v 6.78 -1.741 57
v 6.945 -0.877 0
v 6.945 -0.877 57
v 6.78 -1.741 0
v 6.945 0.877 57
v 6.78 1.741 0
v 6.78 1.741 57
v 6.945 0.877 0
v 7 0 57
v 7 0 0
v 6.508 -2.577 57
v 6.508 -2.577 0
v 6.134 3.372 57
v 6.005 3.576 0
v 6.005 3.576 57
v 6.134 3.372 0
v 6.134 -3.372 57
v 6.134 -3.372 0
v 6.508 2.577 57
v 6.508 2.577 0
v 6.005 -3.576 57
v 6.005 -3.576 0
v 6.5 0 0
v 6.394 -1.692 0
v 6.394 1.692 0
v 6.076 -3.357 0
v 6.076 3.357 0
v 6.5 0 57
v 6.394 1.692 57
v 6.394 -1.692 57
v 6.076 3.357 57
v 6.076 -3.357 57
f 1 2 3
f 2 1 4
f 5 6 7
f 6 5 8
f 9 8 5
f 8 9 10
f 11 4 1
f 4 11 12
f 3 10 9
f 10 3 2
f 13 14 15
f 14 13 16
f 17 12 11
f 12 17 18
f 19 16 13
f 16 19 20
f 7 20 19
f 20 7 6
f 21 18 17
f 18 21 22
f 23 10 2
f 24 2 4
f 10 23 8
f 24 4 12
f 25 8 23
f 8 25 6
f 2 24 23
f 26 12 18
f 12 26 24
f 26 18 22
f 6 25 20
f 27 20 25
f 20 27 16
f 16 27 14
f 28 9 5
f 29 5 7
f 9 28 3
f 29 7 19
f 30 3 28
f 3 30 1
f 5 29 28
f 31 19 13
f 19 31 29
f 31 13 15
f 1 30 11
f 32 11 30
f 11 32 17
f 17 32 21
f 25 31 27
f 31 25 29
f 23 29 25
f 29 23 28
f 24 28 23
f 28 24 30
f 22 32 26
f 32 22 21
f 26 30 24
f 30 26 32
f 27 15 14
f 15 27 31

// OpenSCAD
$fn = 50;


difference() {
	union() {
		cylinder(h = 57, r = 7.0000000000);
		translate(v = [-10.0000000000, 0, 0]) {
			cylinder(h = 57, r = 7.0000000000);
		}
	}
	union() {
		cylinder(h = 57, r = 3.2500000000);
		cylinder(h = 57, r = 1.8000000000);
		cylinder(h = 57, r = 1.8000000000);
		cylinder(h = 57, r = 1.8000000000);
		translate(v = [-14.5000000000, 0, 0]) {
			hull() {
				translate(v = [-3.7500000000, 0.0000000000, 0]) {
					cylinder(h = 57, r = 7.5000000000);
				}
				translate(v = [3.7500000000, 0.0000000000, 0]) {
					cylinder(h = 57, r = 7.5000000000);
				}
				translate(v = [-3.7500000000, -0.0000000000, 0]) {
					cylinder(h = 57, r = 7.5000000000);
				}
				translate(v = [3.7500000000, -0.0000000000, 0]) {
					cylinder(h = 57, r = 7.5000000000);
				}
			}
		}
		translate(v = [-7.0000000000, 0, 0.0000000000]) {
			cylinder(h = 57, r = 13.5000000000);
		}
	}
}
